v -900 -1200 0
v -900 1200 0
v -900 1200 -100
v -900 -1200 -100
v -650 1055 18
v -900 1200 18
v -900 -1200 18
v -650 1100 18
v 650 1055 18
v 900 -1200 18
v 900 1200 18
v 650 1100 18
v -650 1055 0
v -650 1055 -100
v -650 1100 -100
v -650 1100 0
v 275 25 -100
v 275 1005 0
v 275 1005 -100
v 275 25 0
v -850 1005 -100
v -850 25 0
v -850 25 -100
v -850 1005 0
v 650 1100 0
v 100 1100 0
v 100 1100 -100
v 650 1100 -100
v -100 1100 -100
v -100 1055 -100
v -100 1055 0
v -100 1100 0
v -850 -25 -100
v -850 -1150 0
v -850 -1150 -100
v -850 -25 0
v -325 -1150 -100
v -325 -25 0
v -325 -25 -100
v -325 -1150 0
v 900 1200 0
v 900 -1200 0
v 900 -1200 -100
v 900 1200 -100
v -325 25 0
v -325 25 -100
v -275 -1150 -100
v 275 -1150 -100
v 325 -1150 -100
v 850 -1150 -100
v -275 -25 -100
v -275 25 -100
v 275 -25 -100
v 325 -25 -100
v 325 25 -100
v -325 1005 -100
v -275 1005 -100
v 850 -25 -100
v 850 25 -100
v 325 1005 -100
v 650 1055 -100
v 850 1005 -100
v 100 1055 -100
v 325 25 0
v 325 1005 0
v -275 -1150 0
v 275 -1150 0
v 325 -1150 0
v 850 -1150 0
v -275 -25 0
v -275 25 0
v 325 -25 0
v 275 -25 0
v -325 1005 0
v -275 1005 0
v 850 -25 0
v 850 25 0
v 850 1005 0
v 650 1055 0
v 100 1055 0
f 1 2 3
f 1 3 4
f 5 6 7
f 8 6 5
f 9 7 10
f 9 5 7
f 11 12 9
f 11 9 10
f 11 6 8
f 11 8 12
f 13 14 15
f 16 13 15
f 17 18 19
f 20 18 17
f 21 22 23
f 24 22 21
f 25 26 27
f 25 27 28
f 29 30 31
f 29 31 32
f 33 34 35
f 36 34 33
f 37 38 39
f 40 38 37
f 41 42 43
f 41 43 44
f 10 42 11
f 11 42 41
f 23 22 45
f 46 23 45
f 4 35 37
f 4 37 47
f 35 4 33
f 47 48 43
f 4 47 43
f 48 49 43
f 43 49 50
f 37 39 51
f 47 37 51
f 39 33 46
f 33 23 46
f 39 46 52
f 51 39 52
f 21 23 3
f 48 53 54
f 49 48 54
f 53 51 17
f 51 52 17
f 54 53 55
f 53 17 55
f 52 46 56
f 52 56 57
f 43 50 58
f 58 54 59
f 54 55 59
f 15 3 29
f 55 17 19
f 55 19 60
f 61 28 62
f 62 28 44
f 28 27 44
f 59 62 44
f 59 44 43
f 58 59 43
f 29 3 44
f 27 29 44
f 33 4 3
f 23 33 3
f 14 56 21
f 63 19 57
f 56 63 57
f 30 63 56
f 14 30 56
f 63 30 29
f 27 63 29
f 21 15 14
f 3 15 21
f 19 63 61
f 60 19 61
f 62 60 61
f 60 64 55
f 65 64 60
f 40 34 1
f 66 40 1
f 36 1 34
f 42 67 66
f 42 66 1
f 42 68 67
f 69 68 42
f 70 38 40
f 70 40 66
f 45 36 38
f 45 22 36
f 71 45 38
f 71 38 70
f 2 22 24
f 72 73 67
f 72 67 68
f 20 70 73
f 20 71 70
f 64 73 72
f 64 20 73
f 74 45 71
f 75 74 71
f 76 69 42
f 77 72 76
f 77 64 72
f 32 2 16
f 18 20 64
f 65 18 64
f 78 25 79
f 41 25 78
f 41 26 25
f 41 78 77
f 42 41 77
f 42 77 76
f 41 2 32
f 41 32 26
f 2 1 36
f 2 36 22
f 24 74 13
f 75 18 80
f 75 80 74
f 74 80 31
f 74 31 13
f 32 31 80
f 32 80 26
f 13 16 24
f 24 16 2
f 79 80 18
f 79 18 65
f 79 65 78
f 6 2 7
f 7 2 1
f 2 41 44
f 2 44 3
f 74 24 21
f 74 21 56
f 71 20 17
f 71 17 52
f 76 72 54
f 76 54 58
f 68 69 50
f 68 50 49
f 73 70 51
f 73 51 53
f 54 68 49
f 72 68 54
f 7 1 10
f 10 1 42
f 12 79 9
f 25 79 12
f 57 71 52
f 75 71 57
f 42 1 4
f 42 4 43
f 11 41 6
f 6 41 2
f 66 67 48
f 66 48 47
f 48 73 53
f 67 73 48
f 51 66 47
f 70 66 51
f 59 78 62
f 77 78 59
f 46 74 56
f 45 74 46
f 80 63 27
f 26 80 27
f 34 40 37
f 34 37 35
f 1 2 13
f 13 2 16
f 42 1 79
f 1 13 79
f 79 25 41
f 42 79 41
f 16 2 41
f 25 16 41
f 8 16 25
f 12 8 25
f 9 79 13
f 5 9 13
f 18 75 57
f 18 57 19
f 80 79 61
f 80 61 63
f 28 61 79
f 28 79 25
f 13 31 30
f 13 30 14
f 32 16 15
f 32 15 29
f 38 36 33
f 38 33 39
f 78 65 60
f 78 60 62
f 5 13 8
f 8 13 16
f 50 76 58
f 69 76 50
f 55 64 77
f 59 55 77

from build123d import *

# Parameters (mm, degrees)
F0_W     = 525
F0_H     = 50
F0_W_2   = 200
F0_H_2   = 45
F1_DEPTH = 100
F0_H_3   = 1125
F0_H_4   = 980
F2_DEPTH = 18


# Not quite as in the source:
# - a feature names something its author has since deleted; it is built from what else it names


with BuildPart() as f1:
    # F0 (on Top) → F1 (new body)
    with BuildSketch(Plane.XY):
        Polygon((850, -1150), (900, -1150), (900, 1150), (850, 1150), (850, 1100), (850, 1055), (850, 1005), (850, 25), (850, -25), align=None)
        Polygon((-900, -1200), (900, -1200), (900, -1150), (850, -1150), (325, -1150), (275, -1150), (-275, -1150), (-325, -1150), (-850, -1150), (-900, -1150), align=None)
        Polygon((-900, 1150), (-900, -1150), (-850, -1150), (-850, -25), (-850, 25), (-850, 1005), (-850, 1055), (-850, 1100), (-850, 1150), align=None)
        with Locations((-587.5, 0)):
            Rectangle(F0_W, F0_H)
        Polygon((0, -25), (275, -25), (275, 25), (0, 25), (-275, 25), (-275, -25), align=None)
        Polygon((275, -1150), (325, -1150), (325, -25), (325, 25), (325, 1005), (275, 1005), (275, 25), (275, -25), align=None)
        with Locations((587.5, 0)):
            Rectangle(F0_W, F0_H)
        Polygon((850, 1150), (900, 1150), (900, 1200), (-900, 1200), (-900, 1150), (-850, 1150), align=None)
        Polygon((850, 1005), (850, 1055), (650, 1055), (100, 1055), (-100, 1055), (-650, 1055), (-850, 1055), (-850, 1005), (-325, 1005), (-275, 1005), (275, 1005), (325, 1005), align=None)
        Polygon((850, 1100), (850, 1150), (-850, 1150), (-850, 1100), (-650, 1100), (-100, 1100), (100, 1100), (650, 1100), align=None)
        with Locations((-750, 1077.5)):
            Rectangle(F0_W_2, F0_H_2)
        with Locations((0, 1077.5)):
            Rectangle(F0_W_2, F0_H_2)
        with Locations((750, 1077.5)):
            Rectangle(F0_W_2, F0_H_2)
        Polygon((-325, -25), (-325, -1150), (-275, -1150), (-275, -25), (-275, 25), (-275, 1005), (-325, 1005), (-325, 25), align=None)
    extrude(amount=-F1_DEPTH)


with BuildPart() as f2:
    # F0 (on Top) → F2 (new body)
    with BuildSketch(Plane.XY):
        with Locations((-587.5, -587.5)):
            Rectangle(F0_W, F0_H_3)
        Polygon((-275, -1150), (275, -1150), (275, -25), (0, -25), (-275, -25), align=None)
        with Locations((587.5, -587.5)):
            Rectangle(F0_W, F0_H_3)
        with Locations((-587.5, 515)):
            Rectangle(F0_W, F0_H_4)
        Polygon((0, 25), (275, 25), (275, 1005), (-275, 1005), (-275, 25), align=None)
        with Locations((587.5, 515)):
            Rectangle(F0_W, F0_H_4)
        with Locations((750, 1077.5)):
            Rectangle(F0_W_2, F0_H_2)
        Polygon((850, -1150), (900, -1150), (900, 1150), (850, 1150), (850, 1100), (850, 1055), (850, 1005), (850, 25), (850, -25), align=None)
        Polygon((850, 1150), (900, 1150), (900, 1200), (-900, 1200), (-900, 1150), (-850, 1150), align=None)
        Polygon((850, 1100), (850, 1150), (-850, 1150), (-850, 1100), (-650, 1100), (-100, 1100), (100, 1100), (650, 1100), align=None)
        Polygon((-900, 1150), (-900, -1150), (-850, -1150), (-850, -25), (-850, 25), (-850, 1005), (-850, 1055), (-850, 1100), (-850, 1150), align=None)
        with Locations((-750, 1077.5)):
            Rectangle(F0_W_2, F0_H_2)
        Polygon((850, 1005), (850, 1055), (650, 1055), (100, 1055), (-100, 1055), (-650, 1055), (-850, 1055), (-850, 1005), (-325, 1005), (-275, 1005), (275, 1005), (325, 1005), align=None)
        with Locations((-587.5, 0)):
            Rectangle(F0_W, F0_H)
        Polygon((0, -25), (275, -25), (275, 25), (0, 25), (-275, 25), (-275, -25), align=None)
        Polygon((275, -1150), (325, -1150), (325, -25), (325, 25), (325, 1005), (275, 1005), (275, 25), (275, -25), align=None)
        with Locations((587.5, 0)):
            Rectangle(F0_W, F0_H)
        Polygon((-900, -1200), (900, -1200), (900, -1150), (850, -1150), (325, -1150), (275, -1150), (-275, -1150), (-325, -1150), (-850, -1150), (-900, -1150), align=None)
        Polygon((-325, -25), (-325, -1150), (-275, -1150), (-275, -25), (-275, 25), (-275, 1005), (-325, 1005), (-325, 25), align=None)
    extrude(amount=F2_DEPTH)


solid = Compound([f1.part, f2.part])
